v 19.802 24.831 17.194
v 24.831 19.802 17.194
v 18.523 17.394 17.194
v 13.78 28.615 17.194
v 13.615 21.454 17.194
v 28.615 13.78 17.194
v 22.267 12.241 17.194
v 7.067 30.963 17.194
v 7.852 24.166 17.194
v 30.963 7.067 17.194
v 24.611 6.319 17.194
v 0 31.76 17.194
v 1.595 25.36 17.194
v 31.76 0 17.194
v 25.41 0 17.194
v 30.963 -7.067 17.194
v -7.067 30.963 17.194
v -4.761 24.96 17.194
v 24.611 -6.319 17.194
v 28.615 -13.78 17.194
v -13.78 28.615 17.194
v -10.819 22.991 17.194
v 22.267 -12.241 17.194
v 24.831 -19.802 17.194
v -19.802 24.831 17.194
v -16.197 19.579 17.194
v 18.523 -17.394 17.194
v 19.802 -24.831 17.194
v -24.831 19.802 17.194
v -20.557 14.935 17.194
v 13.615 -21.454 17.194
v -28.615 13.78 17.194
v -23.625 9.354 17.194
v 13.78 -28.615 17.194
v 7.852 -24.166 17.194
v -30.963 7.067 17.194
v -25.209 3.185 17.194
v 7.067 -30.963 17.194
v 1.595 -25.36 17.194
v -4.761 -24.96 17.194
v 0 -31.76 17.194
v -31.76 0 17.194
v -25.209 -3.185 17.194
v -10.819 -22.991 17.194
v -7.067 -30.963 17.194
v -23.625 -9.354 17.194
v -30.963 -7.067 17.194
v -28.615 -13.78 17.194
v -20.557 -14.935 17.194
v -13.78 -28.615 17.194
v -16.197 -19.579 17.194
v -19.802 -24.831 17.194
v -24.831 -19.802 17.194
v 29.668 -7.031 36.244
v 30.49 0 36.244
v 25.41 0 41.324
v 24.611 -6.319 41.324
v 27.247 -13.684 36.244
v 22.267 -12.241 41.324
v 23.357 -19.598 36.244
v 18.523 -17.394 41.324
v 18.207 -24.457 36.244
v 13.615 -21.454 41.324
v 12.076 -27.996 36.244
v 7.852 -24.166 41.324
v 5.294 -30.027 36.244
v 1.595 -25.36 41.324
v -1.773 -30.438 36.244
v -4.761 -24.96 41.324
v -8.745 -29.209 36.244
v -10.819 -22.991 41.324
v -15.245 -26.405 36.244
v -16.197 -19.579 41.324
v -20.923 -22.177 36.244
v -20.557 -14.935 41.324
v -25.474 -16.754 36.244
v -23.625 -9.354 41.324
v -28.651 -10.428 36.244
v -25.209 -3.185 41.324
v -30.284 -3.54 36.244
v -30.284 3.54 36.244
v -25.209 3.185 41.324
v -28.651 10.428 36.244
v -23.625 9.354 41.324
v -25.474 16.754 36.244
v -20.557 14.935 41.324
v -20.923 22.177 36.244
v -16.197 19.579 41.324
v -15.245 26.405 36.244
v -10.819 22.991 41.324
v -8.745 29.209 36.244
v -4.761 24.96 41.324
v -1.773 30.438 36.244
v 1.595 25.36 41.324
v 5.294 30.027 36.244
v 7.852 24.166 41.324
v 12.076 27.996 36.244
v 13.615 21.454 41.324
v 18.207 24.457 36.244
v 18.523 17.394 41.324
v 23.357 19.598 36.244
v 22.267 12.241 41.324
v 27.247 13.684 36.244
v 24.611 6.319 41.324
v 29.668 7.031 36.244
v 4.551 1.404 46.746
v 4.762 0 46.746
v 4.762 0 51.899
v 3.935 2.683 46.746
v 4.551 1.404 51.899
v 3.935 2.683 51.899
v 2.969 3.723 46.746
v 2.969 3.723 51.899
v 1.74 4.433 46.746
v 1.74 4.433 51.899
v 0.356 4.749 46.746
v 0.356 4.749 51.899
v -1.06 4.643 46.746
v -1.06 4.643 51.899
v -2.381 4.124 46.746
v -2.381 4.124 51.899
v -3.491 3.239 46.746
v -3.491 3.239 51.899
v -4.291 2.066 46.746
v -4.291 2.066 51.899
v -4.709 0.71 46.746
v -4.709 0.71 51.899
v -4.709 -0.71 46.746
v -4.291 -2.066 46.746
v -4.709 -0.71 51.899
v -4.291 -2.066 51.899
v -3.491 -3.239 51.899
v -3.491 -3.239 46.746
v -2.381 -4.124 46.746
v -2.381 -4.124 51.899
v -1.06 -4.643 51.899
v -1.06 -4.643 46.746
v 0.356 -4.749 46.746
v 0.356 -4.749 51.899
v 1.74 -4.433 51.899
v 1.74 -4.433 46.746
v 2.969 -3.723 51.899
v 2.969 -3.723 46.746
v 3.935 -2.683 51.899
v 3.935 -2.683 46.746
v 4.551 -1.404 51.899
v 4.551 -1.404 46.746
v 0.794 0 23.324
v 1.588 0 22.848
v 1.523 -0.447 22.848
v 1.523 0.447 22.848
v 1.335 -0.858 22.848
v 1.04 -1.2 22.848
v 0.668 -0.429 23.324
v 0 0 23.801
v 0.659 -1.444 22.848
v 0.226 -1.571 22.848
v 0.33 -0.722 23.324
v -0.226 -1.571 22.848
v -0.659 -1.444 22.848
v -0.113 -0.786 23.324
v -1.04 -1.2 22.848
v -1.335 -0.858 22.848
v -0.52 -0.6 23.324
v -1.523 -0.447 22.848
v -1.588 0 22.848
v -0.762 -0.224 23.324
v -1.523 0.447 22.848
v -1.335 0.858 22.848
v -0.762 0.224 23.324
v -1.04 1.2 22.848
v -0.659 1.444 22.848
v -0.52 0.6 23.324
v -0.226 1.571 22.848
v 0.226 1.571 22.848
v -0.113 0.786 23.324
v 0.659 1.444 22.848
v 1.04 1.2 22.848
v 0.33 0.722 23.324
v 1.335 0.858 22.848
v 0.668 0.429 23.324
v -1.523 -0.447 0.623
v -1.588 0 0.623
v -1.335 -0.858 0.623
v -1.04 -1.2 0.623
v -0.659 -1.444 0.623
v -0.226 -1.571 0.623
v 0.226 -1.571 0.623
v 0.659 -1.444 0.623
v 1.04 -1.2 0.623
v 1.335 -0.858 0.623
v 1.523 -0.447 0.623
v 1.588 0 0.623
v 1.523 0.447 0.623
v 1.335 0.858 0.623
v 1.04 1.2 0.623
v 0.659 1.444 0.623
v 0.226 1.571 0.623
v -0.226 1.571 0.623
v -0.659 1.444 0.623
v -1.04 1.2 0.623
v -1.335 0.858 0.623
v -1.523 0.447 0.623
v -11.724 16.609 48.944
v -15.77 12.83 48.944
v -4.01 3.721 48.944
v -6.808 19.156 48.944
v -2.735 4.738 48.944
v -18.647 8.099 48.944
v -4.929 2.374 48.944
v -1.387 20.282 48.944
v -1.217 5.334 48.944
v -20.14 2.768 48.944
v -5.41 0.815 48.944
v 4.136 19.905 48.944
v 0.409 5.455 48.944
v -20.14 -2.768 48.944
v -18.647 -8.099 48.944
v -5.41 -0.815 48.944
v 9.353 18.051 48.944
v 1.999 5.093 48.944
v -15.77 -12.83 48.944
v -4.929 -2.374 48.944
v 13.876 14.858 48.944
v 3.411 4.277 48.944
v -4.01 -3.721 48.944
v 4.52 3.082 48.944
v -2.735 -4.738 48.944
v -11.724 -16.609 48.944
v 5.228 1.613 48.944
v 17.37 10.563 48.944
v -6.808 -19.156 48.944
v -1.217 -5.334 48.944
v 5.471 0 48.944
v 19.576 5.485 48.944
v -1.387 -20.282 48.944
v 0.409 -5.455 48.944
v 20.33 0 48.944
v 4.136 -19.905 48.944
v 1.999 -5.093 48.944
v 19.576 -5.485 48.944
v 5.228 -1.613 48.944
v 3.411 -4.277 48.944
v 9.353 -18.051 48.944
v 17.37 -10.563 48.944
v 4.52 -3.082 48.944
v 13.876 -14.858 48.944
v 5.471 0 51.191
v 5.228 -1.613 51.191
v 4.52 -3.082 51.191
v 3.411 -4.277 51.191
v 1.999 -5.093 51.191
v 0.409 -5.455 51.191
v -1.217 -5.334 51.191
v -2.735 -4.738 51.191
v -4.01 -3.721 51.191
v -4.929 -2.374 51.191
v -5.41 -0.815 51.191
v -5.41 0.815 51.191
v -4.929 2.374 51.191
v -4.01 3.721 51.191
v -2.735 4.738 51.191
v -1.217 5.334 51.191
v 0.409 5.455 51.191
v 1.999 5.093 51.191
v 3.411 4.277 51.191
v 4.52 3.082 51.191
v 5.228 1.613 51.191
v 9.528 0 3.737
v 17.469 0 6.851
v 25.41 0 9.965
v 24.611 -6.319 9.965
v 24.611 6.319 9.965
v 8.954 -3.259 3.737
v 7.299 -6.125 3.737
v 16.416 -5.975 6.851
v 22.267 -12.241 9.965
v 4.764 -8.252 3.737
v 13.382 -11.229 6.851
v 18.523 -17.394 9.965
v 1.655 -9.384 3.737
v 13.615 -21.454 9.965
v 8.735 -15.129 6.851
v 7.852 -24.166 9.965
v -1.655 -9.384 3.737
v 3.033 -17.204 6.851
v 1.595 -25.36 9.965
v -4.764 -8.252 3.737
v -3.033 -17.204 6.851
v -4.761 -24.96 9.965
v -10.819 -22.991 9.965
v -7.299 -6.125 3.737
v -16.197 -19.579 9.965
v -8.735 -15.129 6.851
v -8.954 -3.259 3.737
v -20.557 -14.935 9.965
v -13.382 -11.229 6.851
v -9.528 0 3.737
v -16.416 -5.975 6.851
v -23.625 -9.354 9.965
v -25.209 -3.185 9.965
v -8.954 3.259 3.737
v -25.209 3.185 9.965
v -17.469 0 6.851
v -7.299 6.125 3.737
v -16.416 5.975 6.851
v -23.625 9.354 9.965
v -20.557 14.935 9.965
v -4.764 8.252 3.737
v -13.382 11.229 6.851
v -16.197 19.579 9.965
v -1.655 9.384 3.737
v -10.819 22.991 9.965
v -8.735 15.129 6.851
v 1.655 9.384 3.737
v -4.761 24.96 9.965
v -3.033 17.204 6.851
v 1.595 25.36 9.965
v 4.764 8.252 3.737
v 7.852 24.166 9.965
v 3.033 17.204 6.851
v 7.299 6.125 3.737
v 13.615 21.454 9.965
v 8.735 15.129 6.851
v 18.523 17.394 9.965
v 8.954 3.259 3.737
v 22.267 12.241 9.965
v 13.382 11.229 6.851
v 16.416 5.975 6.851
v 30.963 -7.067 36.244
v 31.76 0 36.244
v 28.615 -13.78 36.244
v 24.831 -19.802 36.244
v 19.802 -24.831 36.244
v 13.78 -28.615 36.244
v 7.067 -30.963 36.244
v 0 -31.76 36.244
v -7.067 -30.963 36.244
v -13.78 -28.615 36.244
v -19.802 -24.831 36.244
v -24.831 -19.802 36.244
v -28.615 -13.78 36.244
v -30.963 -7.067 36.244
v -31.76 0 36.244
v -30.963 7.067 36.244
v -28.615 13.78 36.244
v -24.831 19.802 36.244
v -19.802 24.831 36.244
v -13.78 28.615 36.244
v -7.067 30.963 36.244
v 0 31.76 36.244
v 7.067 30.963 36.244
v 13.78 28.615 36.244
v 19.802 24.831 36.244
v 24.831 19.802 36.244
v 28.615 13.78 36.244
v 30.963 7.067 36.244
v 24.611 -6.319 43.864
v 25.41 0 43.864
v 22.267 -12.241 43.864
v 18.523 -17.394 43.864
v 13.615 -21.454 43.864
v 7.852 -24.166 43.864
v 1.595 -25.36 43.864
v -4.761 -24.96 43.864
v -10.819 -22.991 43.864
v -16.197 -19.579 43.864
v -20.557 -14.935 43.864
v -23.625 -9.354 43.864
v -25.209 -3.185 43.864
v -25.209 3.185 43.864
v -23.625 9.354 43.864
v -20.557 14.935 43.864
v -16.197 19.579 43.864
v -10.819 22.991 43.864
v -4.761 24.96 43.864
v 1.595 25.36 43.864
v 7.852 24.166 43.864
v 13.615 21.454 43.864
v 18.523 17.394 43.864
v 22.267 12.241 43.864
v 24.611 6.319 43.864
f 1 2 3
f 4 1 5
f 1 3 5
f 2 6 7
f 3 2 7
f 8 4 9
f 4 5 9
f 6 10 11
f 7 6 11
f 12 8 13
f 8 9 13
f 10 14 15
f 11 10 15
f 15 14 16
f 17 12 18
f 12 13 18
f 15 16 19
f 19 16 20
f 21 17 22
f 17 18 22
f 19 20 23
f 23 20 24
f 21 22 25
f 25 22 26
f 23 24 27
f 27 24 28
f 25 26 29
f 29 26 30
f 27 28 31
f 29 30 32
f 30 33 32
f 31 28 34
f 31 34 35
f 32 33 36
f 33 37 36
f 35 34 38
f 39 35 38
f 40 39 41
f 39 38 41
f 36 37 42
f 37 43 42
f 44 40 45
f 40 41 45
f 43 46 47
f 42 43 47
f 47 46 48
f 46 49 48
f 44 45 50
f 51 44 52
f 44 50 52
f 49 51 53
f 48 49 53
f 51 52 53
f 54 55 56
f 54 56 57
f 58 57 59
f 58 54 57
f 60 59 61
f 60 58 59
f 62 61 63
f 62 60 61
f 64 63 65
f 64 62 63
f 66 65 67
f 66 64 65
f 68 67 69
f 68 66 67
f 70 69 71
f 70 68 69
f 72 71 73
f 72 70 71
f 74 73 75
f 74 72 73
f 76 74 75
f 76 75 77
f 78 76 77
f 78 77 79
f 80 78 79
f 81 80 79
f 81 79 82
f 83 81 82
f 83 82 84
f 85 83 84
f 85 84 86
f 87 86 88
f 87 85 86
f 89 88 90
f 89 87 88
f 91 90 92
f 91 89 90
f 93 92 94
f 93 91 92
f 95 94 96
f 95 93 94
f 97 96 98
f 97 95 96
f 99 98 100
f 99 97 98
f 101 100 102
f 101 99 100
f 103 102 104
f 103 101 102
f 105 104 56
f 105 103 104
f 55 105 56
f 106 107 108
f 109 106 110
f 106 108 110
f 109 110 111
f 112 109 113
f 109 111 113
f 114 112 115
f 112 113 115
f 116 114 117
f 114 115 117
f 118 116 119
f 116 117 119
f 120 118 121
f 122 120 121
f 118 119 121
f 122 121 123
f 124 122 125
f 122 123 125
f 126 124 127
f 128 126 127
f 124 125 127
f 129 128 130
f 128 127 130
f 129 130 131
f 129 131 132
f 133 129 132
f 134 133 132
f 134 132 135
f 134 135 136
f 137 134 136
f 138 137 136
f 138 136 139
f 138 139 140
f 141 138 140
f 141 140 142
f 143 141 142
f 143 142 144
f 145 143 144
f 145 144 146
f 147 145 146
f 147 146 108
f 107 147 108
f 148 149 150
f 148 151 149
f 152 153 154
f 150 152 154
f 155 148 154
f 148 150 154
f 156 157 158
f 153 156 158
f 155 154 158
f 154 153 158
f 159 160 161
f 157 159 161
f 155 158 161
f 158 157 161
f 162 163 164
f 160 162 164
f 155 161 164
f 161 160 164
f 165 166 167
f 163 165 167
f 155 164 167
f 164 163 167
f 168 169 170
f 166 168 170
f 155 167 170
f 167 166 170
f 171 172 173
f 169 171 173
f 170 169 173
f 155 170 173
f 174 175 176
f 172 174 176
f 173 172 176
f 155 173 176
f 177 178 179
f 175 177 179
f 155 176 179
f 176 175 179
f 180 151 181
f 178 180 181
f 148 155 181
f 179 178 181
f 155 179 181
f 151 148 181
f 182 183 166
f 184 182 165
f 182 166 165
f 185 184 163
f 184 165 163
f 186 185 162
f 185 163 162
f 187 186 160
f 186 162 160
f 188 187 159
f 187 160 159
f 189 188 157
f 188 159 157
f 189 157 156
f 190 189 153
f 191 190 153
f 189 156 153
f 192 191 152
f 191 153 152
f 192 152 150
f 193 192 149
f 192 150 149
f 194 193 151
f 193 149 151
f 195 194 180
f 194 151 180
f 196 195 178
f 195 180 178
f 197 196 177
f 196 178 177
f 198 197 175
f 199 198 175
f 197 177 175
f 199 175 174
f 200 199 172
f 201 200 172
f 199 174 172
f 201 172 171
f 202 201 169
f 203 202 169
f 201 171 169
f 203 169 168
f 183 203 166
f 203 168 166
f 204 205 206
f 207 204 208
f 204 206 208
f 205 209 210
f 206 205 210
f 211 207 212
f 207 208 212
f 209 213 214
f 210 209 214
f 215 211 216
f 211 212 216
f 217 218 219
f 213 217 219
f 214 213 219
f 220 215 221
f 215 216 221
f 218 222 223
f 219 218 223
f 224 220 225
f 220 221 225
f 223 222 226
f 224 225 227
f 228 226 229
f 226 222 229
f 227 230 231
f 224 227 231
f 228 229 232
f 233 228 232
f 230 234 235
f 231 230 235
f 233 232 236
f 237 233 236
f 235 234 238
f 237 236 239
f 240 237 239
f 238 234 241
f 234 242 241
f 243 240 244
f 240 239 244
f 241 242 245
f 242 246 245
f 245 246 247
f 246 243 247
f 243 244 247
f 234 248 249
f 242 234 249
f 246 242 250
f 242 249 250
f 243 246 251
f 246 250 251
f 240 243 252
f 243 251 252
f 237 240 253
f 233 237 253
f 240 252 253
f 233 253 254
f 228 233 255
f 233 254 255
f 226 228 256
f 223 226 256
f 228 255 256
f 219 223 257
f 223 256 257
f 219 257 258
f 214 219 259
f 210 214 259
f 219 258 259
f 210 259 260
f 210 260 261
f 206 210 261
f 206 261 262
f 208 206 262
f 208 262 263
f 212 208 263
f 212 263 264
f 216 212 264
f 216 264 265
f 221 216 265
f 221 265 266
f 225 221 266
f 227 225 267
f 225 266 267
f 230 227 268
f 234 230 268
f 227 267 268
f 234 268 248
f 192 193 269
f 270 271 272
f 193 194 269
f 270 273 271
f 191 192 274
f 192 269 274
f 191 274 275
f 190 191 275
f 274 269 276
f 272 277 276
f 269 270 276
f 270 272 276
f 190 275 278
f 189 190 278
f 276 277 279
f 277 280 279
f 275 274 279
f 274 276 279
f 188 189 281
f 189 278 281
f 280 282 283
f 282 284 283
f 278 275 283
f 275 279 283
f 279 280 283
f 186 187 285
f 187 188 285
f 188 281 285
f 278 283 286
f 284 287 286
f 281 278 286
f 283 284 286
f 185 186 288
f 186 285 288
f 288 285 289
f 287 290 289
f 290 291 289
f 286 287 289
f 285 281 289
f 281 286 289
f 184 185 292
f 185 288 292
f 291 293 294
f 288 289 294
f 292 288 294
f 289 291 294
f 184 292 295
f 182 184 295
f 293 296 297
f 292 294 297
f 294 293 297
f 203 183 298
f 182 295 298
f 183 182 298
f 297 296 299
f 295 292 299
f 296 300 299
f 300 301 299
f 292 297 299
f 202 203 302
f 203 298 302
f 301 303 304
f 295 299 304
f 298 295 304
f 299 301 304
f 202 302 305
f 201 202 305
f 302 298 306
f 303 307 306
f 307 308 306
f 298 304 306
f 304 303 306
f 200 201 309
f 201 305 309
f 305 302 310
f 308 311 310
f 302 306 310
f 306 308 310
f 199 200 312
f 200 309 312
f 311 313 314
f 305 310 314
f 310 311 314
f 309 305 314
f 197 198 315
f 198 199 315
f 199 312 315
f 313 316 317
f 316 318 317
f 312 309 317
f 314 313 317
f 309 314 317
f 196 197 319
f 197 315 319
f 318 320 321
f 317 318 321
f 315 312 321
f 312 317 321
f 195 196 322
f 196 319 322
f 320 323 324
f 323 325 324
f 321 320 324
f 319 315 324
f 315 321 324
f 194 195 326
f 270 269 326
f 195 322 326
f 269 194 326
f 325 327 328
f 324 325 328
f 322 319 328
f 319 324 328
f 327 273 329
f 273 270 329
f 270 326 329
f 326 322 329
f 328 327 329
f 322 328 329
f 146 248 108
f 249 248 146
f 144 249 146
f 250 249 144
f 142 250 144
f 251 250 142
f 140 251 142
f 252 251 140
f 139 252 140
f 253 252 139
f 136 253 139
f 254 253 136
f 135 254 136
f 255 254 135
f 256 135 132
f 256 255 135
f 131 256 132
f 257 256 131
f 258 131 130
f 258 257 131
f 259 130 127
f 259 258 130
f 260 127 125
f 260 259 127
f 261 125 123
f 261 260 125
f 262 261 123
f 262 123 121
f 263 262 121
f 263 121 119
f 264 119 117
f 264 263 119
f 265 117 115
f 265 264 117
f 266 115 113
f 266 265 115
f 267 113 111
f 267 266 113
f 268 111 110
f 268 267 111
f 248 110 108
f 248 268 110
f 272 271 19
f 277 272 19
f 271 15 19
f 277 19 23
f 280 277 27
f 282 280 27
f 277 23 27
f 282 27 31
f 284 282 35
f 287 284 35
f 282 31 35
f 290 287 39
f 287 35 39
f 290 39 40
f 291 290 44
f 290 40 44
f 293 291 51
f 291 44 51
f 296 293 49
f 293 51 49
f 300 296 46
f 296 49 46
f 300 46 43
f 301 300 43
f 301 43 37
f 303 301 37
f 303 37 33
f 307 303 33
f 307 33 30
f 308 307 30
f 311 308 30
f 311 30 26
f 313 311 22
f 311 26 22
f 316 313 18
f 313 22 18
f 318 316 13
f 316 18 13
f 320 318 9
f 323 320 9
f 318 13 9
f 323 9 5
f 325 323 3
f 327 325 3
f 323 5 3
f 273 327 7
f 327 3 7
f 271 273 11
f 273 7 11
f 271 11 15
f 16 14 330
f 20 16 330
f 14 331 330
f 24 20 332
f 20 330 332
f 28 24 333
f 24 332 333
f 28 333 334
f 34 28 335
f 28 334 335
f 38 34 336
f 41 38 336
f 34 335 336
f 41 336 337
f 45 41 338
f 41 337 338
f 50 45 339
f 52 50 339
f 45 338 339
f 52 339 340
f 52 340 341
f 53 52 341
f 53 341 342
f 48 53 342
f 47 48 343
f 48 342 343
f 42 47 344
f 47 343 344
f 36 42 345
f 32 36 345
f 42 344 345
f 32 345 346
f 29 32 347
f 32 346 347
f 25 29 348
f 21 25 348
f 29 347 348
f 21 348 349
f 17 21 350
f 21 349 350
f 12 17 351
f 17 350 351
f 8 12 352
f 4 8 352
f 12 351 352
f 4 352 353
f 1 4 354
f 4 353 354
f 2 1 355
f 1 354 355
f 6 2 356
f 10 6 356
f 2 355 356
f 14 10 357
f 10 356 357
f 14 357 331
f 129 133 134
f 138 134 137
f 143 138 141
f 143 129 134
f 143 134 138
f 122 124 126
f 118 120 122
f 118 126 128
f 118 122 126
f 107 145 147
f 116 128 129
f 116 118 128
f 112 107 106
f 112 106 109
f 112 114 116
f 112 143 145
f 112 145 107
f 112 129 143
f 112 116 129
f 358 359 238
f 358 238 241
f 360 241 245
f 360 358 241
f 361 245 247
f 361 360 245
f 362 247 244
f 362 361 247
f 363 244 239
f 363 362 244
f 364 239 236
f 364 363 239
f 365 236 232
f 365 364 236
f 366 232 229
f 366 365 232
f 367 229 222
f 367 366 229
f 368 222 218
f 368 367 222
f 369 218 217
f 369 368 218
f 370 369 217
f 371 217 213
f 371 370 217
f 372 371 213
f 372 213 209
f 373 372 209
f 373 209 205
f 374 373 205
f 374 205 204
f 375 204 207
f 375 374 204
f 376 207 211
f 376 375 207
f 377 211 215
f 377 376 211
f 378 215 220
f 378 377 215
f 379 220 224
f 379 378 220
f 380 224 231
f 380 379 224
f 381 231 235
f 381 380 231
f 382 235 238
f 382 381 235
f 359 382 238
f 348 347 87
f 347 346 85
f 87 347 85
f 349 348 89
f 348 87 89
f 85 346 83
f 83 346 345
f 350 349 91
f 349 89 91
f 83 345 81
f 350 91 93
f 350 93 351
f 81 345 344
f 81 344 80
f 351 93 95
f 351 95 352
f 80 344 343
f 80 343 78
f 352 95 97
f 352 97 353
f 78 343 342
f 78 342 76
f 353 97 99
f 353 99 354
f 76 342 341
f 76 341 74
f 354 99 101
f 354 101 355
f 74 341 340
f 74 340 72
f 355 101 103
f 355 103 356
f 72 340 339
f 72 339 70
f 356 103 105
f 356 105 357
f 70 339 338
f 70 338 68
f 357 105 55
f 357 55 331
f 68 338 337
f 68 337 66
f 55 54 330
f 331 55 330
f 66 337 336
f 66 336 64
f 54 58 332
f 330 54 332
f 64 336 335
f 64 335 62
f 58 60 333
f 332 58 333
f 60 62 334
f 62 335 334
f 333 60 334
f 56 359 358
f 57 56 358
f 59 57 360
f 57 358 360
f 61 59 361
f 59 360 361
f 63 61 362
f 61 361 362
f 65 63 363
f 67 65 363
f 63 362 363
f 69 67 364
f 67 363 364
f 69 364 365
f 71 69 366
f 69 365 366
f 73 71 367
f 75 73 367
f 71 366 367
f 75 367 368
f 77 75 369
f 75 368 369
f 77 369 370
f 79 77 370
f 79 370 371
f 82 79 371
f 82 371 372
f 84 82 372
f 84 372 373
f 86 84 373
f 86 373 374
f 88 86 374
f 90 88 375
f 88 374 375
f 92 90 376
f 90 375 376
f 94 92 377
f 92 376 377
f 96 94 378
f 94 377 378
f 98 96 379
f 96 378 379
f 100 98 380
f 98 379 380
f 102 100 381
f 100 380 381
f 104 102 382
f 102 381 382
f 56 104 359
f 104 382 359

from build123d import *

# Parameters (mm, degrees)
F2_R     = 4.7625
F3_DEPTH = 9.525
F6_D     = 3.175
F6_DEPTH = 22.225
F6_START = 0.6225488
F6_TIP   = 0.9538662327
F7_SIZE  = 5.08


# Not quite as in the source:
# - a fillet or chamfer that OpenCascade refuses, or shapes differently, is made with other operations: its cross-section is extruded or revolved along the edge and cut away or added


with BuildPart() as f1:
    # F0 (on Front) → F1 (revolve)
    with BuildSketch(Plane.XZ):
        Polygon((5.470779, 56.2707707286), (0, 56.2707707286), (0, 0), (25.409779, 9.9646151066), (25.409779, 17.1938474178), (31.759779, 17.1938474178), (31.759779, 36.2438474178), (25.409779, 36.2438474178), (25.409779, 48.9438474178), (5.470779, 48.9438474178), align=None)
    revolve(axis=Axis((0, 0, 28.1353853643), (0, 0, -1)))

    # F2 (on face) → F3 (cut)
    with BuildSketch(Plane.XY.offset(56.2707707286)):
        Circle(F2_R)
    extrude(amount=-F3_DEPTH, mode=Mode.SUBTRACT)

    # F4: chamfer of 5.08 on 1 edges, made by hand

    # F4_s1 → F4_t2 (revolve, cut)
    with BuildSketch(Plane.XZ):
        Polygon((0.390779, 56.2707707286), (5.470779, 51.1907707286), (5.470779, 56.2707707286), align=None)
    revolve(axis=Axis((0, 0, 56.2707707286), (0, 0, -1)), mode=Mode.SUBTRACT)

    # F6
    # its depths count from where the whole tool has entered the part; down to there all is cleared
    with Locations(Plane(origin=(0, 0, 0), x_dir=(1, 0, 0), z_dir=(0, 0, -1)).offset(-F6_START)):
        with Locations((0, 0)):
            Hole(F6_D / 2, depth=F6_DEPTH)
            with Locations((0, 0, -(F6_DEPTH + F6_TIP / 2))):  # 118° drill point
                Cone(0, F6_D / 2, F6_TIP, mode=Mode.SUBTRACT)

    # F7
    f7_edges = [f1.edges().sort_by_distance(p)[0] for p in [
        (-25.409779, 0, 36.243847),
        (-25.409779, 0, 48.943847),
        (25.409779, 0, 42.593847),
    ]]
    chamfer(f7_edges, length=F7_SIZE)


solid = f1.part
